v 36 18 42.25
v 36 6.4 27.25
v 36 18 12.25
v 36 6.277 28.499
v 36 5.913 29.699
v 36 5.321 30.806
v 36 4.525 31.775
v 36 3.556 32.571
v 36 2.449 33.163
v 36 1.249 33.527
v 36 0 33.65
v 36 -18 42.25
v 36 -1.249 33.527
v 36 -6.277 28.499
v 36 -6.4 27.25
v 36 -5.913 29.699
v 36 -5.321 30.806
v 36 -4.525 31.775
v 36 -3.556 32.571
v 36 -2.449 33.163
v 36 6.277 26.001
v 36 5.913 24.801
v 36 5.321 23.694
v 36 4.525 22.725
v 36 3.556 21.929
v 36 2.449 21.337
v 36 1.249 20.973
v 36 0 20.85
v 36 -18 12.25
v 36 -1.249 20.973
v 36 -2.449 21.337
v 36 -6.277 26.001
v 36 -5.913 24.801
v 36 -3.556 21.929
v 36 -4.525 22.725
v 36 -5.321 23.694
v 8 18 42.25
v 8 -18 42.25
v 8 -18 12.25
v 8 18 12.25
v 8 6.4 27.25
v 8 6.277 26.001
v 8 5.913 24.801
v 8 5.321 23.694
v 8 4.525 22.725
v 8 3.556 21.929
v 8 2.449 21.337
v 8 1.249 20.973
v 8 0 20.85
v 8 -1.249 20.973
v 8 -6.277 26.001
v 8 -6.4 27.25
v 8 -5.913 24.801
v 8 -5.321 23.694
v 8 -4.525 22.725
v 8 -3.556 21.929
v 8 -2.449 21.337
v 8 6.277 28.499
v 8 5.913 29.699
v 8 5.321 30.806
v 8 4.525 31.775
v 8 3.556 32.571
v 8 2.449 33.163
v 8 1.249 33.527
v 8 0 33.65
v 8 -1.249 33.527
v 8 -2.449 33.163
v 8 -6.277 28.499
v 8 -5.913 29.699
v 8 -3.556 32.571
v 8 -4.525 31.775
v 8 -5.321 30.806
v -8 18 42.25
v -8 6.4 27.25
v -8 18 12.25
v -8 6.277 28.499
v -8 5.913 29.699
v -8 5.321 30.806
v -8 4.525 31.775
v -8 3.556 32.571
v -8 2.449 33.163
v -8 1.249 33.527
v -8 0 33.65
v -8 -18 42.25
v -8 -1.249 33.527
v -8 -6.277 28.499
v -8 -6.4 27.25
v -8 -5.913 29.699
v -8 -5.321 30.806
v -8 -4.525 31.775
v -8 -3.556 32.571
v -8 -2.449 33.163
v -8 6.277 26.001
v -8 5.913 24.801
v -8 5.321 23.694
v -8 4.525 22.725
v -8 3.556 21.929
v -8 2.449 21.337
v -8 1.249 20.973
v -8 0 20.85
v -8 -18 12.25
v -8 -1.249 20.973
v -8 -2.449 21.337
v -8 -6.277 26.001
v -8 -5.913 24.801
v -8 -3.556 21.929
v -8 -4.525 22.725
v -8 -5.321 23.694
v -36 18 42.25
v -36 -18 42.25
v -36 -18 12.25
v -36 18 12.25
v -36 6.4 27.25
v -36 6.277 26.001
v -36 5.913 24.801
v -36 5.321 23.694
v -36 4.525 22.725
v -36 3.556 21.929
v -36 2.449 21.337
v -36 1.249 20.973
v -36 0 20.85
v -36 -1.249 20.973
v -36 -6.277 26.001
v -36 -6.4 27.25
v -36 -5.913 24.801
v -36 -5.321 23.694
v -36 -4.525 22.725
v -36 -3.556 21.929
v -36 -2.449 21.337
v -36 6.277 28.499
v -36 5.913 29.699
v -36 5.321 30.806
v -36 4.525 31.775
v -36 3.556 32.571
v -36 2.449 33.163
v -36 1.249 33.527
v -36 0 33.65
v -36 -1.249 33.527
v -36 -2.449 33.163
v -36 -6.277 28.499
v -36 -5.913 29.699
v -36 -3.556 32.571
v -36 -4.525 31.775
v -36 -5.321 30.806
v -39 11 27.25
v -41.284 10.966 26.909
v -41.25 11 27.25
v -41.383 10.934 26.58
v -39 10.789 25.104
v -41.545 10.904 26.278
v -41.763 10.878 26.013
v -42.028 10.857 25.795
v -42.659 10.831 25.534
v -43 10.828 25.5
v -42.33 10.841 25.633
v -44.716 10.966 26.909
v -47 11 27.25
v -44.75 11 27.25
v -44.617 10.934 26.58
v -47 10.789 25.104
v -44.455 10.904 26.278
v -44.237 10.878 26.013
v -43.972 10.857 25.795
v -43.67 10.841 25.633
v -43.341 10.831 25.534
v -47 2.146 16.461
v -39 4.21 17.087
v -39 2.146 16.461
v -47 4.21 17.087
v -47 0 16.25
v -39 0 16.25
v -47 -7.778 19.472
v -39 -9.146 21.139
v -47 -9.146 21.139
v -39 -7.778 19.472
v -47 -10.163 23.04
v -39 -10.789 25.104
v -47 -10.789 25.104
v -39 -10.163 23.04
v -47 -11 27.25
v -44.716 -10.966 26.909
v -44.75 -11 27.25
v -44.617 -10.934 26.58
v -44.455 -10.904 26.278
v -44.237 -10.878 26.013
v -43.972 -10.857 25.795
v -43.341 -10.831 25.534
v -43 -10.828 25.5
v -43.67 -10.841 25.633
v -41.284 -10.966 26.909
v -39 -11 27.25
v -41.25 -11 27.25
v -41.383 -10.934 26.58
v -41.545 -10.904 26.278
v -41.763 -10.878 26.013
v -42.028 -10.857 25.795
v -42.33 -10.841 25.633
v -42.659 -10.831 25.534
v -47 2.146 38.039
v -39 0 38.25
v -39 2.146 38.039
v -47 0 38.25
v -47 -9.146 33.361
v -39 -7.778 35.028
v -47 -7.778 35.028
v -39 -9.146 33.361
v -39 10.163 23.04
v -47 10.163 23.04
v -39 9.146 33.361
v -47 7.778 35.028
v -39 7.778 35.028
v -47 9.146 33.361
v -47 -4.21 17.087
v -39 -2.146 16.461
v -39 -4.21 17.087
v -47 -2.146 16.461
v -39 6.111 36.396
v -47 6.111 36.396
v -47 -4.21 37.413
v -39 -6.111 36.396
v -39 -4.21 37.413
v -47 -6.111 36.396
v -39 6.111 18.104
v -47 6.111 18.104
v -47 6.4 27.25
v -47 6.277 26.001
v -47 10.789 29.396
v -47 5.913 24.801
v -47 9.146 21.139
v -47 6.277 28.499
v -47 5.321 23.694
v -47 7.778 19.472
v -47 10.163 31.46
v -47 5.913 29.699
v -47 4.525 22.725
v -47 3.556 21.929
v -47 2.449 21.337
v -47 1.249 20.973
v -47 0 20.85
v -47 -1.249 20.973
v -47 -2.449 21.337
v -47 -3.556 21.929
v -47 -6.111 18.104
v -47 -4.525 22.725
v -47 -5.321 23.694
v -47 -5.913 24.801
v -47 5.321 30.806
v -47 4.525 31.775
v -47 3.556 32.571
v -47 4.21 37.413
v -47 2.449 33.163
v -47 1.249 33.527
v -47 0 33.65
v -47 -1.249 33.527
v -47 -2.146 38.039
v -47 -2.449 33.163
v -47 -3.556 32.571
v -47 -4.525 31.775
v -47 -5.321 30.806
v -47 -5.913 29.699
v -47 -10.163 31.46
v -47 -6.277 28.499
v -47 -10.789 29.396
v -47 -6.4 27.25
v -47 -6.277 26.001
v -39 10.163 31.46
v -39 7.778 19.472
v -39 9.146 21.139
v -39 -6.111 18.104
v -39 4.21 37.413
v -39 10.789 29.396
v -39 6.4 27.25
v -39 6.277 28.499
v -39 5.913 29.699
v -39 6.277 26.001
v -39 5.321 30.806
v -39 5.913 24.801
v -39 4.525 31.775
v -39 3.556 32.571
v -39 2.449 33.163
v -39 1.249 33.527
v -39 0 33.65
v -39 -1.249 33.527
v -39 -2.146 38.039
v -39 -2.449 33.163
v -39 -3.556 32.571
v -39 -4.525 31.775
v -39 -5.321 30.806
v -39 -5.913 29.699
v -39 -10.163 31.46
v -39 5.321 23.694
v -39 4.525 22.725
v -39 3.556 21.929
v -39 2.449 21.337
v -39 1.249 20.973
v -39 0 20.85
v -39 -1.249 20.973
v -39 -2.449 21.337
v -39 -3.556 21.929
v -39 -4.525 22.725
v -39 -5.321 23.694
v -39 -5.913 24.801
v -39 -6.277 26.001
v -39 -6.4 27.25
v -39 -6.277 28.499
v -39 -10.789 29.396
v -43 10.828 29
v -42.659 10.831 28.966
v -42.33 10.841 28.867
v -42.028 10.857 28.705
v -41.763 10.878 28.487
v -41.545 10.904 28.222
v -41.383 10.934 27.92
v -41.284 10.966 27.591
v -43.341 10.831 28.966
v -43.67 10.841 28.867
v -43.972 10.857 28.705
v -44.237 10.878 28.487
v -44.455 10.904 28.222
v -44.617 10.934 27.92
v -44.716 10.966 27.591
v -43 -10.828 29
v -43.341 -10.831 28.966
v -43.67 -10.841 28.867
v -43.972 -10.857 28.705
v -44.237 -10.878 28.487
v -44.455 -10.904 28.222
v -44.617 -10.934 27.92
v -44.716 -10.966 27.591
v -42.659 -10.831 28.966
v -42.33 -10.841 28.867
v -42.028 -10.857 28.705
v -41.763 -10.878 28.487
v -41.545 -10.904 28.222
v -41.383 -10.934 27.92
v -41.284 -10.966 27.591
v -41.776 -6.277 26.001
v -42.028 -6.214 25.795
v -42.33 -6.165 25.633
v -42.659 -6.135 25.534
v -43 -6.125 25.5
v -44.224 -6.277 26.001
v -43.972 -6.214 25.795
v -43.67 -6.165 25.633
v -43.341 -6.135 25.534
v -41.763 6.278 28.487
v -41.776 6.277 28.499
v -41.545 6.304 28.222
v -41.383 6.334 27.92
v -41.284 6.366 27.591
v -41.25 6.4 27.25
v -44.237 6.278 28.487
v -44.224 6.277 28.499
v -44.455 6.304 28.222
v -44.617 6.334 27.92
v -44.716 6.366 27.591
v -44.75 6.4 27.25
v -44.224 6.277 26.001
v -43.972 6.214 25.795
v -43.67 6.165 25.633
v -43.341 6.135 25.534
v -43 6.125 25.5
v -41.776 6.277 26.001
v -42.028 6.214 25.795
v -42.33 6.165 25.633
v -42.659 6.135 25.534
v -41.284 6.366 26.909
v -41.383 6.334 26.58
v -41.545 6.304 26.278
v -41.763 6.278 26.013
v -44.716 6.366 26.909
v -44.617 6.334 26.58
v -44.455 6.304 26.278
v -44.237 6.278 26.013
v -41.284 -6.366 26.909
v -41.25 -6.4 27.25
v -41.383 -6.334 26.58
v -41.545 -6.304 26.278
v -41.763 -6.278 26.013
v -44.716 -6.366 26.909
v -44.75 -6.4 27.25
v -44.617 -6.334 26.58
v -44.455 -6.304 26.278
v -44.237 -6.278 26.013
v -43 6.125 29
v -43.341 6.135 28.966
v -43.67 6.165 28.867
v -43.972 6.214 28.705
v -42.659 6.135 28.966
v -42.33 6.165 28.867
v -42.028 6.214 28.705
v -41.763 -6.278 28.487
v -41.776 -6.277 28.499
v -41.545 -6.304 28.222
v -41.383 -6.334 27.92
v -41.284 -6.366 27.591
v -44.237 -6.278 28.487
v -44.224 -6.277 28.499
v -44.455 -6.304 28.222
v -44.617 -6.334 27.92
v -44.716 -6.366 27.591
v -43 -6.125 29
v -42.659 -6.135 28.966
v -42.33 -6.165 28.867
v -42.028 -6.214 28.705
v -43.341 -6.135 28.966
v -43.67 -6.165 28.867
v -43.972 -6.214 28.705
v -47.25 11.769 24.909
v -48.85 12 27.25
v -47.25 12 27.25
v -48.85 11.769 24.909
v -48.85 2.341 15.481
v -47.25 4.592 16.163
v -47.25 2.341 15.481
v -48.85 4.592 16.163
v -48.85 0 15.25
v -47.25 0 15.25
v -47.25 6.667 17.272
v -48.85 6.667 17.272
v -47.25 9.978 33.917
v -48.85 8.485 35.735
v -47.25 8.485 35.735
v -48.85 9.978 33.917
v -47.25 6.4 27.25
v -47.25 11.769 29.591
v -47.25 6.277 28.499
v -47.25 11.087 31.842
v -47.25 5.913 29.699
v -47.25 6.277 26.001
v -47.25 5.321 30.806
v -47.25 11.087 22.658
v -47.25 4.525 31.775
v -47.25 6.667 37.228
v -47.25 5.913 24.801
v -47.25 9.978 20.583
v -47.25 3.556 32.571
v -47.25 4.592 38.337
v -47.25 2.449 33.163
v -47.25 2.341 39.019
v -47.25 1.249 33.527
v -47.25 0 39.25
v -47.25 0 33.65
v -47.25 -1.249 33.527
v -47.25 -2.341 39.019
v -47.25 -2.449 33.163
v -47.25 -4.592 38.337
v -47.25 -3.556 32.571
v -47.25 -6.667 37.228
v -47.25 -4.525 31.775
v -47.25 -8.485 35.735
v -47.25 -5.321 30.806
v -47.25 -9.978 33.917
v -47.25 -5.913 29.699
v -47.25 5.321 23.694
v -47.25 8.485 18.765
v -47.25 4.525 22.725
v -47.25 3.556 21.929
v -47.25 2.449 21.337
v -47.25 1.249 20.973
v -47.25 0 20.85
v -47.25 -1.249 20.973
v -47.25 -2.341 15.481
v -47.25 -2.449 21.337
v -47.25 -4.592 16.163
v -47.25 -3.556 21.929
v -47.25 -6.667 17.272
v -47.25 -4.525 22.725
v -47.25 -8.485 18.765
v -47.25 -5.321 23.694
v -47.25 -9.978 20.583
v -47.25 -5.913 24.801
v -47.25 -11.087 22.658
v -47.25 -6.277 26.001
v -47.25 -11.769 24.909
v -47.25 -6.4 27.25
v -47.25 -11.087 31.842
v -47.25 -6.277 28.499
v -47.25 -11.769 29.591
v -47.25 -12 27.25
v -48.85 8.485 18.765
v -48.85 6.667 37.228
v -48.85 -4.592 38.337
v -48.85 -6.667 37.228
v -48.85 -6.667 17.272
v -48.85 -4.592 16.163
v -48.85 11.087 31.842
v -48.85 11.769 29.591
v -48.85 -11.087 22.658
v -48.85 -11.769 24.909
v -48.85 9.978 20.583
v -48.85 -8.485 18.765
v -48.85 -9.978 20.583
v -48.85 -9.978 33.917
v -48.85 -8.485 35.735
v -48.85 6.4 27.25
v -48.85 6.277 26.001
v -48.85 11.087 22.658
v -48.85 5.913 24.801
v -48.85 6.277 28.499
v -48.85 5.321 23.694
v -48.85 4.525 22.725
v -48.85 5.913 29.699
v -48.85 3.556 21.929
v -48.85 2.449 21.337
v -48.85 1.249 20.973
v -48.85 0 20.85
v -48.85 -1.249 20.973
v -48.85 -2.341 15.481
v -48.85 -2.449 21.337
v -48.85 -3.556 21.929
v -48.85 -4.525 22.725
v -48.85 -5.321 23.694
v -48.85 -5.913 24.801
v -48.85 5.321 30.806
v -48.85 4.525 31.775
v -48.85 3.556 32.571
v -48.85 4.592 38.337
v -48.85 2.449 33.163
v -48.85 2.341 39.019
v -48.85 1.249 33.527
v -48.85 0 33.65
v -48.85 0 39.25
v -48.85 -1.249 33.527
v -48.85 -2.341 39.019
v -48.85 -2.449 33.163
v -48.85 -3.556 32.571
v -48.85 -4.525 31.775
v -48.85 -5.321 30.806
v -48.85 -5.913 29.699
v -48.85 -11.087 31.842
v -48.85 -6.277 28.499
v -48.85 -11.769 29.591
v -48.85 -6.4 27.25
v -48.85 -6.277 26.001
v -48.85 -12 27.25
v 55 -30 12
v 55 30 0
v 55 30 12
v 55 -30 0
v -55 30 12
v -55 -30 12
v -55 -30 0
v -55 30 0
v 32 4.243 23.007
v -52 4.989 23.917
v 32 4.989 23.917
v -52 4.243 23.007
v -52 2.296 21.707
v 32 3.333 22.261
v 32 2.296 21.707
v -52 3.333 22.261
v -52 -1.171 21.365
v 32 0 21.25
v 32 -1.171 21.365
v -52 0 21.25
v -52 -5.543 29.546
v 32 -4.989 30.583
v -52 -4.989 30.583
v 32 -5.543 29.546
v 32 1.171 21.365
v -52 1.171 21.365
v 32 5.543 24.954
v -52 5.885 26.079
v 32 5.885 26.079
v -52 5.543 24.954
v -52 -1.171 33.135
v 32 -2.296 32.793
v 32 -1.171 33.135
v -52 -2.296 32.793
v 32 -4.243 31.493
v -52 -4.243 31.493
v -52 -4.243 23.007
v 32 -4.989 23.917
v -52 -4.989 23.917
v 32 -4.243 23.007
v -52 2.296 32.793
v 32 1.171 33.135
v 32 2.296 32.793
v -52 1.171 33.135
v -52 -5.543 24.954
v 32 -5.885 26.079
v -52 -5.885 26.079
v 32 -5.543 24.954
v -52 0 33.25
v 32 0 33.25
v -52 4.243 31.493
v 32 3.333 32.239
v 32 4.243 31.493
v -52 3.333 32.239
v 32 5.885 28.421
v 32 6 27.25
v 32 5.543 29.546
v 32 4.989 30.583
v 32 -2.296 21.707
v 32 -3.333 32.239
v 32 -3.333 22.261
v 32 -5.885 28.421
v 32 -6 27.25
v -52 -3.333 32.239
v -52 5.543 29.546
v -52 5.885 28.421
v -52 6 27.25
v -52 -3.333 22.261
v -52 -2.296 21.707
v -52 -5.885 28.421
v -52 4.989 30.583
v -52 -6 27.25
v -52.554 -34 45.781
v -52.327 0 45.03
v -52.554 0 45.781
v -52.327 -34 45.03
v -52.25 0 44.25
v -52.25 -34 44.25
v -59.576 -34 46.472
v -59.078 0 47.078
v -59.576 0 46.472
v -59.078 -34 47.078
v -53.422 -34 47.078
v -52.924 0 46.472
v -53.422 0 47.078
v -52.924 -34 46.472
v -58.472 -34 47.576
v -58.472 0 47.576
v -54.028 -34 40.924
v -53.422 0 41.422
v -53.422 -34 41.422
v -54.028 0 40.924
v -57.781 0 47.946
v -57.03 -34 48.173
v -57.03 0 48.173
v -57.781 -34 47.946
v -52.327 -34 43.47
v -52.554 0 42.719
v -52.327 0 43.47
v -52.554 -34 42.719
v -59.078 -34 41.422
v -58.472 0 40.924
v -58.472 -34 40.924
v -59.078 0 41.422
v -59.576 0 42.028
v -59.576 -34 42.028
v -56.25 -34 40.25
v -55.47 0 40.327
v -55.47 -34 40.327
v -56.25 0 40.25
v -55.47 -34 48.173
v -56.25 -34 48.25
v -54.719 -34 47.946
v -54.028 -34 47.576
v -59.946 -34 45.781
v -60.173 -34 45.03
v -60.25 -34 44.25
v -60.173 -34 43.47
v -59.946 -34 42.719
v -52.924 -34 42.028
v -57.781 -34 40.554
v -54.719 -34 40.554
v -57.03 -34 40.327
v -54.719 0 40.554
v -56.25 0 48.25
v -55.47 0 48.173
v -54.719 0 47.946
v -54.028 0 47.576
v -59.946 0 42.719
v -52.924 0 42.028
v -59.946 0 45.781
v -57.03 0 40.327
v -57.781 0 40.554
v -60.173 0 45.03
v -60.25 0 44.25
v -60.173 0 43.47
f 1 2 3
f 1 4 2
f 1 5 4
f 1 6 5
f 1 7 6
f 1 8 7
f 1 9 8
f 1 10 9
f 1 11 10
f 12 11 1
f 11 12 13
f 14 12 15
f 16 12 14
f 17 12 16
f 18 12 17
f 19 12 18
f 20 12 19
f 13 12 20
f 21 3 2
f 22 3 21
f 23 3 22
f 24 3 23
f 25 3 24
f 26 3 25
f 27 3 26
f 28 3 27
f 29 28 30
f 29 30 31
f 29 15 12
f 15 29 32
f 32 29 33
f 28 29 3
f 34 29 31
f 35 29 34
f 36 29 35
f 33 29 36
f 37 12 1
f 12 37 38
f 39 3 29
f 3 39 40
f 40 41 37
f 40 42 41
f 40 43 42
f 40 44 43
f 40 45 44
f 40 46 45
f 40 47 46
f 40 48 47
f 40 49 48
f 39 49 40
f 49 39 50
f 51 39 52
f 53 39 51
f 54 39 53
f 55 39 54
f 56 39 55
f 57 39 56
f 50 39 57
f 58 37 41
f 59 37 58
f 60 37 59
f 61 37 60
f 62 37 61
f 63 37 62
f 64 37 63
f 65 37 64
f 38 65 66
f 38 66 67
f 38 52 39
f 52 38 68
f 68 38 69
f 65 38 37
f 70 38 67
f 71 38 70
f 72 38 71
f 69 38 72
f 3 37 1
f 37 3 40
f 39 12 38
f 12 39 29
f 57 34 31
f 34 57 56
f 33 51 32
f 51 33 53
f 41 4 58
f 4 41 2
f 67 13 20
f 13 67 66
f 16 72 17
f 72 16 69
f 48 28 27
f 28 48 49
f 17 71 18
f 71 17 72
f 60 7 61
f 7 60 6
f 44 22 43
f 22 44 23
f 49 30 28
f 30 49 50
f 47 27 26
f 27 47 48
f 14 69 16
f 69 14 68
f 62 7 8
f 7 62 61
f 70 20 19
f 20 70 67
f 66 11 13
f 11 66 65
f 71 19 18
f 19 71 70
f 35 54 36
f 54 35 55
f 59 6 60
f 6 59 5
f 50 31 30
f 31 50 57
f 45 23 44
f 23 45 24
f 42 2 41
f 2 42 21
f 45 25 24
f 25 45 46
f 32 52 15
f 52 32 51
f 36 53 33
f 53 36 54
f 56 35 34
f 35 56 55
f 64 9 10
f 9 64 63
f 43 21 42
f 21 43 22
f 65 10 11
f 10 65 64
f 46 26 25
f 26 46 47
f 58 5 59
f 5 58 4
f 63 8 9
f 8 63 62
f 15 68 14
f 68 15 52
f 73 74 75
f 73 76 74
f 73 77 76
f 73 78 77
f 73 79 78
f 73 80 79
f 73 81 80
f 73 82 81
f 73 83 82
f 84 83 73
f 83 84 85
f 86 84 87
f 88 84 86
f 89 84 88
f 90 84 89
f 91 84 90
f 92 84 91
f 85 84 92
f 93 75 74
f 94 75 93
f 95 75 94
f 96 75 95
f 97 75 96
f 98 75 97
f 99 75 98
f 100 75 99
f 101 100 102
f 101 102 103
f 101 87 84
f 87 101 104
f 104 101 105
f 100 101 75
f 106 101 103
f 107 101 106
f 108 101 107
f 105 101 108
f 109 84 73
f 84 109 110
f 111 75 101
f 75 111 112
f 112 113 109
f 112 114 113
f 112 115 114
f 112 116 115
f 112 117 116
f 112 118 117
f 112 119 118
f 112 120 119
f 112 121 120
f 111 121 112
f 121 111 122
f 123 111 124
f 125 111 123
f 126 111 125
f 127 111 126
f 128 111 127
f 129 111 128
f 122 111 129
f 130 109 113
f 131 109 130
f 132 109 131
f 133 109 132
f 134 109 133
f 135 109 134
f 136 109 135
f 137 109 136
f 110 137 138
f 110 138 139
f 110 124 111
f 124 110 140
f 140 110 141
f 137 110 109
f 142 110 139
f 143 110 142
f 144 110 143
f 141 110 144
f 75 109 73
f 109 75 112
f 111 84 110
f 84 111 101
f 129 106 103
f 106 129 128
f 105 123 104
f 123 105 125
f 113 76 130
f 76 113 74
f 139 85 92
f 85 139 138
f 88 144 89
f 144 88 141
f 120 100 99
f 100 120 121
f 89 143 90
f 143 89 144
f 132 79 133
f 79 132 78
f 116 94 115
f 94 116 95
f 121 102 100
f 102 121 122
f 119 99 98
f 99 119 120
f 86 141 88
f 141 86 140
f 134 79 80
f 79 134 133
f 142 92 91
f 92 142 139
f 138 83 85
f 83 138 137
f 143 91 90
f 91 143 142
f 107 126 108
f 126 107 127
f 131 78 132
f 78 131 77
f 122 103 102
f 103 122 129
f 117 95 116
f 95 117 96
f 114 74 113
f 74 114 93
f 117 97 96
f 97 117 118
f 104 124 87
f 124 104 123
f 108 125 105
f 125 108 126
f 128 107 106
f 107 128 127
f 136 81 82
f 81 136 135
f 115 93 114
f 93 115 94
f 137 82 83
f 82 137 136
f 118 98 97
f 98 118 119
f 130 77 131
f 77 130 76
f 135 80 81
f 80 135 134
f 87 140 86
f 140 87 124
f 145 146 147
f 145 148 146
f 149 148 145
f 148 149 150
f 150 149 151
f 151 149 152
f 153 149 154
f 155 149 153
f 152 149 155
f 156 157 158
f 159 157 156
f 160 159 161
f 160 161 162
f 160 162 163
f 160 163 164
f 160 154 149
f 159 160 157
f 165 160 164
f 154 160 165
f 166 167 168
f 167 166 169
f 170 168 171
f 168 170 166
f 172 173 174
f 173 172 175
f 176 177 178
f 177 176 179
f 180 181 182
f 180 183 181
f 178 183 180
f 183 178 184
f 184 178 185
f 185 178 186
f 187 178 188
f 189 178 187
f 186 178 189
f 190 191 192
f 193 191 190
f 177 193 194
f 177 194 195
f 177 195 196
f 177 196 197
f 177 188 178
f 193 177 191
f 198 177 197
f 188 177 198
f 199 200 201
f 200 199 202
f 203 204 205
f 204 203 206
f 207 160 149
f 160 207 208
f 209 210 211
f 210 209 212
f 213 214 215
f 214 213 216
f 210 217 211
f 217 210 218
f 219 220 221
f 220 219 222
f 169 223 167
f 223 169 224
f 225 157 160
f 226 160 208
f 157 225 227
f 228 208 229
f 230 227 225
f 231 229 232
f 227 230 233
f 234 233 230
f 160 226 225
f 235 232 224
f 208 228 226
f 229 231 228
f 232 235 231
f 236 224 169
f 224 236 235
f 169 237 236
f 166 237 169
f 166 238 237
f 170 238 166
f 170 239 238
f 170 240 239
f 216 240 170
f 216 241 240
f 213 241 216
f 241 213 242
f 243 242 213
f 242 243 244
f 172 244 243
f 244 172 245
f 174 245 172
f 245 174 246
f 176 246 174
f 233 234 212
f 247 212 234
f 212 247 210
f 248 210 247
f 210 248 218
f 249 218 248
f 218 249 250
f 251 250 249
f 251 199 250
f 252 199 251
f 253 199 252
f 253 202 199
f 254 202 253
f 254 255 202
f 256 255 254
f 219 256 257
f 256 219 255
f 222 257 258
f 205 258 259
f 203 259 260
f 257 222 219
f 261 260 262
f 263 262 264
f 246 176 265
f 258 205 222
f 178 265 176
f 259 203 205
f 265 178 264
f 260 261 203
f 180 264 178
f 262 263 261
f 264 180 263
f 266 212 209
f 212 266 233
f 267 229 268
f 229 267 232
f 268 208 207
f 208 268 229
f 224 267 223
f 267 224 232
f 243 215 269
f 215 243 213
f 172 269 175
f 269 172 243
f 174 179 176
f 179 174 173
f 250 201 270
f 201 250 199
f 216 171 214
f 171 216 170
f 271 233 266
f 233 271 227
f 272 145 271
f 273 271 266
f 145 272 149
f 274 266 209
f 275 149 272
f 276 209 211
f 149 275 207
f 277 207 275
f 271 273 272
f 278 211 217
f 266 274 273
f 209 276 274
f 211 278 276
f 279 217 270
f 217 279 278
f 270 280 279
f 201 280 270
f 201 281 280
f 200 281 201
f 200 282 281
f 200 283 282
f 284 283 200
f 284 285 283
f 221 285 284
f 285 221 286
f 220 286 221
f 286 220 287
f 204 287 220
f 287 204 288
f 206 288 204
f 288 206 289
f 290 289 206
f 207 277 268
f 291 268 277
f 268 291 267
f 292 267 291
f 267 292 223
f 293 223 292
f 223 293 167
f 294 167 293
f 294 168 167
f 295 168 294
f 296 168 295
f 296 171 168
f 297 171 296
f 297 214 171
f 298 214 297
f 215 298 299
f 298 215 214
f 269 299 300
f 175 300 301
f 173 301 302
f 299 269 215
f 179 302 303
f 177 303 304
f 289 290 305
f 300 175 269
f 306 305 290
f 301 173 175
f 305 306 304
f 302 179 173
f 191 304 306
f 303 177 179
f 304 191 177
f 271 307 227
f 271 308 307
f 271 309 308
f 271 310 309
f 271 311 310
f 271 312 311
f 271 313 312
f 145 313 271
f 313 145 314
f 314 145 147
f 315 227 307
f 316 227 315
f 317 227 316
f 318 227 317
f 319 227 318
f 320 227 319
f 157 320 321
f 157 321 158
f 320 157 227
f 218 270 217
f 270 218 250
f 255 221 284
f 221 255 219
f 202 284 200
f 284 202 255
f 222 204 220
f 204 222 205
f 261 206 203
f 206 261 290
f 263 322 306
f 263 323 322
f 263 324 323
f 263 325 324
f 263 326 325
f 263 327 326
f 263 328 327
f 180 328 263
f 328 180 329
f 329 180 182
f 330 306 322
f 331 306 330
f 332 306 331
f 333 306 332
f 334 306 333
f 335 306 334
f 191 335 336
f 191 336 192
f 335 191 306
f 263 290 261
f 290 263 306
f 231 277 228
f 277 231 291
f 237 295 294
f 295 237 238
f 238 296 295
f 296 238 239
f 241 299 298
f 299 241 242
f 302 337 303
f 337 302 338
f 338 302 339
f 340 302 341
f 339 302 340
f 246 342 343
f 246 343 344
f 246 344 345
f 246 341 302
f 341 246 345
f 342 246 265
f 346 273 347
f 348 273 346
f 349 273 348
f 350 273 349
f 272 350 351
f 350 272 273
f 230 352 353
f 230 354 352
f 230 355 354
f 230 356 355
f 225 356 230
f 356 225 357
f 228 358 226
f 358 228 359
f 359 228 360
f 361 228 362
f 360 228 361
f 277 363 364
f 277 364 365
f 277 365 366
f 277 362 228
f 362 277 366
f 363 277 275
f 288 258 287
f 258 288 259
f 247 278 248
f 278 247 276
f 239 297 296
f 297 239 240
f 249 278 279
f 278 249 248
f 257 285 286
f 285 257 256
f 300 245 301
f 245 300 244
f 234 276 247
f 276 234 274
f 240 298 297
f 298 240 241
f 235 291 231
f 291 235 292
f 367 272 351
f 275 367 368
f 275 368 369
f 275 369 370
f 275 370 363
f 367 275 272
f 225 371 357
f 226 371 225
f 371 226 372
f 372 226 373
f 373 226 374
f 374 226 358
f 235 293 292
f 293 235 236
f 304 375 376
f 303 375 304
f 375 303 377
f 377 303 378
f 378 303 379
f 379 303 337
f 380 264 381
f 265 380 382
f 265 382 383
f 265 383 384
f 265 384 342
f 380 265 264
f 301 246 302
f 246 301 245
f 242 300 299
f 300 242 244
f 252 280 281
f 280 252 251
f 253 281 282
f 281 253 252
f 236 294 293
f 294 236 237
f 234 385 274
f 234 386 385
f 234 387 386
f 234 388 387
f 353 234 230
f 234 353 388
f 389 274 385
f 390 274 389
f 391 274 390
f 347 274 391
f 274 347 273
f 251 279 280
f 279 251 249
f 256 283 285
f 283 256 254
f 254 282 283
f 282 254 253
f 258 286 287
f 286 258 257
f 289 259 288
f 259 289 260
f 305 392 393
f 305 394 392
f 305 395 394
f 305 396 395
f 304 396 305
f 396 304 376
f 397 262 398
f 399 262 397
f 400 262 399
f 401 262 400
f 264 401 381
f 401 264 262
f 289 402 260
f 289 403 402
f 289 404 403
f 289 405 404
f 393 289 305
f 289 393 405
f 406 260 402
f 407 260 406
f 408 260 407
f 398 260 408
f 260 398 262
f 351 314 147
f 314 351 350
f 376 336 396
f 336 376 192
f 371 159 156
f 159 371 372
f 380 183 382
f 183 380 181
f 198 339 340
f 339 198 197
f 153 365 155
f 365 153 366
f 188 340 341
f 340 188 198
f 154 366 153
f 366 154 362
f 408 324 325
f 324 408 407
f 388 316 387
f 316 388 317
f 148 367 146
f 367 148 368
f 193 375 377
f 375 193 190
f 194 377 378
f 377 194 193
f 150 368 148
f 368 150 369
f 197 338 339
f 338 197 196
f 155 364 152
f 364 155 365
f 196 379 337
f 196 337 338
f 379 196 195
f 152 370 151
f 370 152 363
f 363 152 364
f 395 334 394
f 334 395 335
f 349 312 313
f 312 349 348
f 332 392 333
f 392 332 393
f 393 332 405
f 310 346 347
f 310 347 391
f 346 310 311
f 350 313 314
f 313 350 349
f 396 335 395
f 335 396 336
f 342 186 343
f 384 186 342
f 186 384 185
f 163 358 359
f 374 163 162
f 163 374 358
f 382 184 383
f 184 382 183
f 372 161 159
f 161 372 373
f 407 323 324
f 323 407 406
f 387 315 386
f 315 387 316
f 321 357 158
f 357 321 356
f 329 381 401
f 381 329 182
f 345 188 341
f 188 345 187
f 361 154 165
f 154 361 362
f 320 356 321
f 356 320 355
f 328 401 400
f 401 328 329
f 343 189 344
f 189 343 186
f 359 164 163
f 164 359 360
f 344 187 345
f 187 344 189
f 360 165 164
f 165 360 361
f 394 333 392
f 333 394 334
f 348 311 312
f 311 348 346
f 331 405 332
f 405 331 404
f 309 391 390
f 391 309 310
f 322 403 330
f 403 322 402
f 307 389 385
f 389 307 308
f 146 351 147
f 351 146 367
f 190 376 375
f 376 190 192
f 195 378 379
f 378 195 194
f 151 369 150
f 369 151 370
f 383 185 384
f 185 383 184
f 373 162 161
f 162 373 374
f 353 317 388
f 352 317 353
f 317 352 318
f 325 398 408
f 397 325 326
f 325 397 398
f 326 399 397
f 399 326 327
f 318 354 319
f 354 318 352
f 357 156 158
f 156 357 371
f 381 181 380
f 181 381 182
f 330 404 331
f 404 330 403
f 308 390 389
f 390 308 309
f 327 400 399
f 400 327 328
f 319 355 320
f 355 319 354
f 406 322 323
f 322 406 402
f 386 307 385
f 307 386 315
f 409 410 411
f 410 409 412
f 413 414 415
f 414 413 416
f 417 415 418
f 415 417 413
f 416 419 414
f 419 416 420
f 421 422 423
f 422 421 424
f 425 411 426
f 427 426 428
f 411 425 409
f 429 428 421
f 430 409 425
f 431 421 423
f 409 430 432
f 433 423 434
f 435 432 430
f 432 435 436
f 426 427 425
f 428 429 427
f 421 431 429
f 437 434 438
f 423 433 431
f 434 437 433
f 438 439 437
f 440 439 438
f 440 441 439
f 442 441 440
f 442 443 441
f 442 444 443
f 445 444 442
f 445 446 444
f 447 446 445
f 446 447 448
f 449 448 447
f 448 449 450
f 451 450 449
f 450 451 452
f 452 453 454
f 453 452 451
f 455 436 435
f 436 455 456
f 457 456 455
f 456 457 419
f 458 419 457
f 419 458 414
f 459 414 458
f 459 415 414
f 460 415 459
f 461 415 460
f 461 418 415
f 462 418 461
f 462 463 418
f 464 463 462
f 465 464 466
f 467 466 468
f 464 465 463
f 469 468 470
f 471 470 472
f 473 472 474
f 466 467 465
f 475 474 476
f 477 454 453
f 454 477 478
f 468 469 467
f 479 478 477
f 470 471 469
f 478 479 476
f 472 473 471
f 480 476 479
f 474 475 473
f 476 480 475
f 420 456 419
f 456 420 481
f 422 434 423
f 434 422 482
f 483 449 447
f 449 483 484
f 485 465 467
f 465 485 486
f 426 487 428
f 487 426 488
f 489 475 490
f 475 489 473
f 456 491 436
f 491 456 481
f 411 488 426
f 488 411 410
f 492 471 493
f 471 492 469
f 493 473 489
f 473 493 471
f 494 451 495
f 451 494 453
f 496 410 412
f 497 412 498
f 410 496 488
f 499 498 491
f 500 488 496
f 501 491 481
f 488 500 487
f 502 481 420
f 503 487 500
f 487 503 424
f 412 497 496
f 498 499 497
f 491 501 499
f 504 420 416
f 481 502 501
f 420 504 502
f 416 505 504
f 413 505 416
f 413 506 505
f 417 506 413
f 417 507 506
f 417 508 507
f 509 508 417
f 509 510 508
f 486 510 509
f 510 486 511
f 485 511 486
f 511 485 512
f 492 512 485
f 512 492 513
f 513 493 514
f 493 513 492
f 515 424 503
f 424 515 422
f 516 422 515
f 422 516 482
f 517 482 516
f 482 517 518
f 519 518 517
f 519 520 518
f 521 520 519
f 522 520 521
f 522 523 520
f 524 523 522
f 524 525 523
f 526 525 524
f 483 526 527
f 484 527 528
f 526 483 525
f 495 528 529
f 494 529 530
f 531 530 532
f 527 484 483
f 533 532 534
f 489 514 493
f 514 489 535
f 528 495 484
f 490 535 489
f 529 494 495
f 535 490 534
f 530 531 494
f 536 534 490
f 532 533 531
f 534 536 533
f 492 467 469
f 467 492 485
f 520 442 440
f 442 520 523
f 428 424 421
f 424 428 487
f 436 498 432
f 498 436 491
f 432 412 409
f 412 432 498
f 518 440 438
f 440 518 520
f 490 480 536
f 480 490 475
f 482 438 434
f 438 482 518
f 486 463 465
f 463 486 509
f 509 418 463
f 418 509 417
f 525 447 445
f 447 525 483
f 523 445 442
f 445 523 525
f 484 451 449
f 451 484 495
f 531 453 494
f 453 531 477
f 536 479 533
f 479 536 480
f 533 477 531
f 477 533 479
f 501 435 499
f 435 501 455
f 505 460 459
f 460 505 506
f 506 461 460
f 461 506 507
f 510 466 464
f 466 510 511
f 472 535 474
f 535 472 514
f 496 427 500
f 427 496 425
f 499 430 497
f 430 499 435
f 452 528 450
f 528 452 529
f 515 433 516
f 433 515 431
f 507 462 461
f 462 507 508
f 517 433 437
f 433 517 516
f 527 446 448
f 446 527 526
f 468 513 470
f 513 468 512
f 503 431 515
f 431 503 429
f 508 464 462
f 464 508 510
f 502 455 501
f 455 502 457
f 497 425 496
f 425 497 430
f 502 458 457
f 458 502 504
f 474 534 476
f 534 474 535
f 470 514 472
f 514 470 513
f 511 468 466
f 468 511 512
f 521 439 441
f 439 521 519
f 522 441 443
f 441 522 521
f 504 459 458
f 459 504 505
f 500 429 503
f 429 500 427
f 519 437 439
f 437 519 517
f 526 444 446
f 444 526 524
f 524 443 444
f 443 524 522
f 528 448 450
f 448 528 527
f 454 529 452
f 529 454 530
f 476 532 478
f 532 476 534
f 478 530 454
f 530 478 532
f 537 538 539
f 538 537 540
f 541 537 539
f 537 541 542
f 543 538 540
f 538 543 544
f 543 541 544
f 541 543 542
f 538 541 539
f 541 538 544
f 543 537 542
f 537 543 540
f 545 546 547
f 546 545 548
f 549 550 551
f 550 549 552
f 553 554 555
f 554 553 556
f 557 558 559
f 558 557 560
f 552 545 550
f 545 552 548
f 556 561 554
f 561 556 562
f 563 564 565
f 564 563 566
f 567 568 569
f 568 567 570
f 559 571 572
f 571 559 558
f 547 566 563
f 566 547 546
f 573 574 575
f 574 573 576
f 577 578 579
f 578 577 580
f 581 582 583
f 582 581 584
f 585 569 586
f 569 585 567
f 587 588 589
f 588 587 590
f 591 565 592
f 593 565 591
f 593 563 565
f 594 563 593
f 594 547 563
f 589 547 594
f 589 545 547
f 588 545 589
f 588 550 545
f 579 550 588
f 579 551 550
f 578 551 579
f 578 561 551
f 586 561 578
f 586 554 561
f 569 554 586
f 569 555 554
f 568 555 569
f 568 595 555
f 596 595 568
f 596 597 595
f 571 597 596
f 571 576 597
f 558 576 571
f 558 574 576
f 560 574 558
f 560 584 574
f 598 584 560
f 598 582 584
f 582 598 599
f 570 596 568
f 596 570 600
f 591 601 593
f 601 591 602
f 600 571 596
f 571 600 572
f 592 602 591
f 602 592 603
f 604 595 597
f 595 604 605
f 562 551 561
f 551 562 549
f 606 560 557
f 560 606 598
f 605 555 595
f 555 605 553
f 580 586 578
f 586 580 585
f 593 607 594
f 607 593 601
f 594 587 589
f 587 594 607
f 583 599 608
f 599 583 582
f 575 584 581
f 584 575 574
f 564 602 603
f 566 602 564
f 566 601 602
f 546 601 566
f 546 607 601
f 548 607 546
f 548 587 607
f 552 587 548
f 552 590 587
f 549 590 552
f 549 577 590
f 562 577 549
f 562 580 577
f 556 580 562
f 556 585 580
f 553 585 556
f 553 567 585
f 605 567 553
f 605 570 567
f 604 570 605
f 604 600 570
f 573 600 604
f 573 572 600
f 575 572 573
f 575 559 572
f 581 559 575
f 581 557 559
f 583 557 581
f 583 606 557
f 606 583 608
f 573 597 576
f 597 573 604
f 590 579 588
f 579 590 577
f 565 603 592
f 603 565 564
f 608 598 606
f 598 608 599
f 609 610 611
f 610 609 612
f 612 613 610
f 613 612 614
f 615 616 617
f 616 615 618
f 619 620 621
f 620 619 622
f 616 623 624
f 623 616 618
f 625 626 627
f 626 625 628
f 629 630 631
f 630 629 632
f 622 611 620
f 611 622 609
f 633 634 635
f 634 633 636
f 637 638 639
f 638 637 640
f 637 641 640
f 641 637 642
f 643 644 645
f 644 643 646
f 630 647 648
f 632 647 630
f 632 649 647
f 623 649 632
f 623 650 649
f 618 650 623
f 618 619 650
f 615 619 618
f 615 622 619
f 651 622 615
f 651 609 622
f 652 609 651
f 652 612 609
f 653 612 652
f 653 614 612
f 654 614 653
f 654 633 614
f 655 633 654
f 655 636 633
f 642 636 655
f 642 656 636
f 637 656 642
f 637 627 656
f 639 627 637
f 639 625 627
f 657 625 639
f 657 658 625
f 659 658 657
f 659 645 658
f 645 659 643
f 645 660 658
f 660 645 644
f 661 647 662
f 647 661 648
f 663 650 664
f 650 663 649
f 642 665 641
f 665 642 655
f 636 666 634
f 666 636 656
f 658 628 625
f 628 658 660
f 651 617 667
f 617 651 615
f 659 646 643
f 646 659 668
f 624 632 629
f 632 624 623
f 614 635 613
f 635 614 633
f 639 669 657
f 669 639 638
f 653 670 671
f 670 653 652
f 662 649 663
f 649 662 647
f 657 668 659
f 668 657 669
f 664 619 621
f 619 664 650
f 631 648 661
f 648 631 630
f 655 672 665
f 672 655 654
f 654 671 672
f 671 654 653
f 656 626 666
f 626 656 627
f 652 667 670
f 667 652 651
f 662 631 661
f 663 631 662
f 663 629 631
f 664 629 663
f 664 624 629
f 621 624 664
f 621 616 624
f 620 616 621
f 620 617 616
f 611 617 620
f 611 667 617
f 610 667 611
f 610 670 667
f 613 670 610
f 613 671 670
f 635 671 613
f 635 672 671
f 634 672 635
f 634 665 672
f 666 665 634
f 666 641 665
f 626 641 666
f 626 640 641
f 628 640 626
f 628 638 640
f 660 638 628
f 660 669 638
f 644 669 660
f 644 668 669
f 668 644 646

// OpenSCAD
$fn = 32;

// ------------------------------------------------------------------------
// Machine vise: screw d12, jaws 28 x 30 mm
// Every part is its own module, assembly() places every instance.
// ------------------------------------------------------------------------

// --- part 1 ---
module vise_bed() {
  difference() {
    translate([-55, -30, 0]) cube([110, 60, 12]);
  }
}

// --- part 2 ---
module vise_jaw() {
  difference() {
    translate([-14, -18, 0]) cube([28, 36, 30]);
    translate([0, 0, 15]) rotate([0, 90, 0]) cylinder(h = 30, d = 12.8, center = true);
  }
}

// --- part 3 ---
module vise_screw() {
  translate([0, 0, -42]) cylinder(h = 84, d = 12);
}

// --- part 4 ---
module screw_collar() {
  difference() {
    cylinder(h = 8, d = 22);
    translate([0, 0, -1]) cylinder(h = 10, d = 12.8);
    translate([0, 0, 4]) rotate([90, 0, 0]) cylinder(h = 24, d = 3.5, center = true);
  }
}

// --- part 5 ---
module screw_washer() {
  difference() {
      translate([0, 0, 0]) cylinder(h = 1.6, d = 24);
      translate([0, 0, -1]) cylinder(h = 3.6, d = 12.8);
    }
}

// --- part 6 ---
module vise_handle() {
  cylinder(h = 34, d = 8);
}

// --- assembly ---
module assembly() {
  color([0.80, 0.24, 0.20]) translate([0, 0, 0]) rotate([0, 0, 0]) vise_bed();
  color([0.20, 0.45, 0.75]) translate([22, 0, 12.25]) rotate([0, 0, 0]) vise_jaw();
  color([0.25, 0.62, 0.32]) translate([-22, 0, 12.25]) rotate([0, 0, 0]) vise_jaw();
  color([0.92, 0.70, 0.18]) translate([-10, 0, 27.25]) rotate([0, 90, 0]) vise_screw();
  color([0.58, 0.35, 0.70]) translate([-47, 0, 27.25]) rotate([0, 90, 0]) screw_collar();
  color([0.16, 0.66, 0.66]) translate([-48.85, 0, 27.25]) rotate([0, 90, 0]) screw_washer();
  color([0.85, 0.48, 0.18]) translate([-56.25, 0, 44.25]) rotate([90, 0, 0]) vise_handle();
}

assembly();
